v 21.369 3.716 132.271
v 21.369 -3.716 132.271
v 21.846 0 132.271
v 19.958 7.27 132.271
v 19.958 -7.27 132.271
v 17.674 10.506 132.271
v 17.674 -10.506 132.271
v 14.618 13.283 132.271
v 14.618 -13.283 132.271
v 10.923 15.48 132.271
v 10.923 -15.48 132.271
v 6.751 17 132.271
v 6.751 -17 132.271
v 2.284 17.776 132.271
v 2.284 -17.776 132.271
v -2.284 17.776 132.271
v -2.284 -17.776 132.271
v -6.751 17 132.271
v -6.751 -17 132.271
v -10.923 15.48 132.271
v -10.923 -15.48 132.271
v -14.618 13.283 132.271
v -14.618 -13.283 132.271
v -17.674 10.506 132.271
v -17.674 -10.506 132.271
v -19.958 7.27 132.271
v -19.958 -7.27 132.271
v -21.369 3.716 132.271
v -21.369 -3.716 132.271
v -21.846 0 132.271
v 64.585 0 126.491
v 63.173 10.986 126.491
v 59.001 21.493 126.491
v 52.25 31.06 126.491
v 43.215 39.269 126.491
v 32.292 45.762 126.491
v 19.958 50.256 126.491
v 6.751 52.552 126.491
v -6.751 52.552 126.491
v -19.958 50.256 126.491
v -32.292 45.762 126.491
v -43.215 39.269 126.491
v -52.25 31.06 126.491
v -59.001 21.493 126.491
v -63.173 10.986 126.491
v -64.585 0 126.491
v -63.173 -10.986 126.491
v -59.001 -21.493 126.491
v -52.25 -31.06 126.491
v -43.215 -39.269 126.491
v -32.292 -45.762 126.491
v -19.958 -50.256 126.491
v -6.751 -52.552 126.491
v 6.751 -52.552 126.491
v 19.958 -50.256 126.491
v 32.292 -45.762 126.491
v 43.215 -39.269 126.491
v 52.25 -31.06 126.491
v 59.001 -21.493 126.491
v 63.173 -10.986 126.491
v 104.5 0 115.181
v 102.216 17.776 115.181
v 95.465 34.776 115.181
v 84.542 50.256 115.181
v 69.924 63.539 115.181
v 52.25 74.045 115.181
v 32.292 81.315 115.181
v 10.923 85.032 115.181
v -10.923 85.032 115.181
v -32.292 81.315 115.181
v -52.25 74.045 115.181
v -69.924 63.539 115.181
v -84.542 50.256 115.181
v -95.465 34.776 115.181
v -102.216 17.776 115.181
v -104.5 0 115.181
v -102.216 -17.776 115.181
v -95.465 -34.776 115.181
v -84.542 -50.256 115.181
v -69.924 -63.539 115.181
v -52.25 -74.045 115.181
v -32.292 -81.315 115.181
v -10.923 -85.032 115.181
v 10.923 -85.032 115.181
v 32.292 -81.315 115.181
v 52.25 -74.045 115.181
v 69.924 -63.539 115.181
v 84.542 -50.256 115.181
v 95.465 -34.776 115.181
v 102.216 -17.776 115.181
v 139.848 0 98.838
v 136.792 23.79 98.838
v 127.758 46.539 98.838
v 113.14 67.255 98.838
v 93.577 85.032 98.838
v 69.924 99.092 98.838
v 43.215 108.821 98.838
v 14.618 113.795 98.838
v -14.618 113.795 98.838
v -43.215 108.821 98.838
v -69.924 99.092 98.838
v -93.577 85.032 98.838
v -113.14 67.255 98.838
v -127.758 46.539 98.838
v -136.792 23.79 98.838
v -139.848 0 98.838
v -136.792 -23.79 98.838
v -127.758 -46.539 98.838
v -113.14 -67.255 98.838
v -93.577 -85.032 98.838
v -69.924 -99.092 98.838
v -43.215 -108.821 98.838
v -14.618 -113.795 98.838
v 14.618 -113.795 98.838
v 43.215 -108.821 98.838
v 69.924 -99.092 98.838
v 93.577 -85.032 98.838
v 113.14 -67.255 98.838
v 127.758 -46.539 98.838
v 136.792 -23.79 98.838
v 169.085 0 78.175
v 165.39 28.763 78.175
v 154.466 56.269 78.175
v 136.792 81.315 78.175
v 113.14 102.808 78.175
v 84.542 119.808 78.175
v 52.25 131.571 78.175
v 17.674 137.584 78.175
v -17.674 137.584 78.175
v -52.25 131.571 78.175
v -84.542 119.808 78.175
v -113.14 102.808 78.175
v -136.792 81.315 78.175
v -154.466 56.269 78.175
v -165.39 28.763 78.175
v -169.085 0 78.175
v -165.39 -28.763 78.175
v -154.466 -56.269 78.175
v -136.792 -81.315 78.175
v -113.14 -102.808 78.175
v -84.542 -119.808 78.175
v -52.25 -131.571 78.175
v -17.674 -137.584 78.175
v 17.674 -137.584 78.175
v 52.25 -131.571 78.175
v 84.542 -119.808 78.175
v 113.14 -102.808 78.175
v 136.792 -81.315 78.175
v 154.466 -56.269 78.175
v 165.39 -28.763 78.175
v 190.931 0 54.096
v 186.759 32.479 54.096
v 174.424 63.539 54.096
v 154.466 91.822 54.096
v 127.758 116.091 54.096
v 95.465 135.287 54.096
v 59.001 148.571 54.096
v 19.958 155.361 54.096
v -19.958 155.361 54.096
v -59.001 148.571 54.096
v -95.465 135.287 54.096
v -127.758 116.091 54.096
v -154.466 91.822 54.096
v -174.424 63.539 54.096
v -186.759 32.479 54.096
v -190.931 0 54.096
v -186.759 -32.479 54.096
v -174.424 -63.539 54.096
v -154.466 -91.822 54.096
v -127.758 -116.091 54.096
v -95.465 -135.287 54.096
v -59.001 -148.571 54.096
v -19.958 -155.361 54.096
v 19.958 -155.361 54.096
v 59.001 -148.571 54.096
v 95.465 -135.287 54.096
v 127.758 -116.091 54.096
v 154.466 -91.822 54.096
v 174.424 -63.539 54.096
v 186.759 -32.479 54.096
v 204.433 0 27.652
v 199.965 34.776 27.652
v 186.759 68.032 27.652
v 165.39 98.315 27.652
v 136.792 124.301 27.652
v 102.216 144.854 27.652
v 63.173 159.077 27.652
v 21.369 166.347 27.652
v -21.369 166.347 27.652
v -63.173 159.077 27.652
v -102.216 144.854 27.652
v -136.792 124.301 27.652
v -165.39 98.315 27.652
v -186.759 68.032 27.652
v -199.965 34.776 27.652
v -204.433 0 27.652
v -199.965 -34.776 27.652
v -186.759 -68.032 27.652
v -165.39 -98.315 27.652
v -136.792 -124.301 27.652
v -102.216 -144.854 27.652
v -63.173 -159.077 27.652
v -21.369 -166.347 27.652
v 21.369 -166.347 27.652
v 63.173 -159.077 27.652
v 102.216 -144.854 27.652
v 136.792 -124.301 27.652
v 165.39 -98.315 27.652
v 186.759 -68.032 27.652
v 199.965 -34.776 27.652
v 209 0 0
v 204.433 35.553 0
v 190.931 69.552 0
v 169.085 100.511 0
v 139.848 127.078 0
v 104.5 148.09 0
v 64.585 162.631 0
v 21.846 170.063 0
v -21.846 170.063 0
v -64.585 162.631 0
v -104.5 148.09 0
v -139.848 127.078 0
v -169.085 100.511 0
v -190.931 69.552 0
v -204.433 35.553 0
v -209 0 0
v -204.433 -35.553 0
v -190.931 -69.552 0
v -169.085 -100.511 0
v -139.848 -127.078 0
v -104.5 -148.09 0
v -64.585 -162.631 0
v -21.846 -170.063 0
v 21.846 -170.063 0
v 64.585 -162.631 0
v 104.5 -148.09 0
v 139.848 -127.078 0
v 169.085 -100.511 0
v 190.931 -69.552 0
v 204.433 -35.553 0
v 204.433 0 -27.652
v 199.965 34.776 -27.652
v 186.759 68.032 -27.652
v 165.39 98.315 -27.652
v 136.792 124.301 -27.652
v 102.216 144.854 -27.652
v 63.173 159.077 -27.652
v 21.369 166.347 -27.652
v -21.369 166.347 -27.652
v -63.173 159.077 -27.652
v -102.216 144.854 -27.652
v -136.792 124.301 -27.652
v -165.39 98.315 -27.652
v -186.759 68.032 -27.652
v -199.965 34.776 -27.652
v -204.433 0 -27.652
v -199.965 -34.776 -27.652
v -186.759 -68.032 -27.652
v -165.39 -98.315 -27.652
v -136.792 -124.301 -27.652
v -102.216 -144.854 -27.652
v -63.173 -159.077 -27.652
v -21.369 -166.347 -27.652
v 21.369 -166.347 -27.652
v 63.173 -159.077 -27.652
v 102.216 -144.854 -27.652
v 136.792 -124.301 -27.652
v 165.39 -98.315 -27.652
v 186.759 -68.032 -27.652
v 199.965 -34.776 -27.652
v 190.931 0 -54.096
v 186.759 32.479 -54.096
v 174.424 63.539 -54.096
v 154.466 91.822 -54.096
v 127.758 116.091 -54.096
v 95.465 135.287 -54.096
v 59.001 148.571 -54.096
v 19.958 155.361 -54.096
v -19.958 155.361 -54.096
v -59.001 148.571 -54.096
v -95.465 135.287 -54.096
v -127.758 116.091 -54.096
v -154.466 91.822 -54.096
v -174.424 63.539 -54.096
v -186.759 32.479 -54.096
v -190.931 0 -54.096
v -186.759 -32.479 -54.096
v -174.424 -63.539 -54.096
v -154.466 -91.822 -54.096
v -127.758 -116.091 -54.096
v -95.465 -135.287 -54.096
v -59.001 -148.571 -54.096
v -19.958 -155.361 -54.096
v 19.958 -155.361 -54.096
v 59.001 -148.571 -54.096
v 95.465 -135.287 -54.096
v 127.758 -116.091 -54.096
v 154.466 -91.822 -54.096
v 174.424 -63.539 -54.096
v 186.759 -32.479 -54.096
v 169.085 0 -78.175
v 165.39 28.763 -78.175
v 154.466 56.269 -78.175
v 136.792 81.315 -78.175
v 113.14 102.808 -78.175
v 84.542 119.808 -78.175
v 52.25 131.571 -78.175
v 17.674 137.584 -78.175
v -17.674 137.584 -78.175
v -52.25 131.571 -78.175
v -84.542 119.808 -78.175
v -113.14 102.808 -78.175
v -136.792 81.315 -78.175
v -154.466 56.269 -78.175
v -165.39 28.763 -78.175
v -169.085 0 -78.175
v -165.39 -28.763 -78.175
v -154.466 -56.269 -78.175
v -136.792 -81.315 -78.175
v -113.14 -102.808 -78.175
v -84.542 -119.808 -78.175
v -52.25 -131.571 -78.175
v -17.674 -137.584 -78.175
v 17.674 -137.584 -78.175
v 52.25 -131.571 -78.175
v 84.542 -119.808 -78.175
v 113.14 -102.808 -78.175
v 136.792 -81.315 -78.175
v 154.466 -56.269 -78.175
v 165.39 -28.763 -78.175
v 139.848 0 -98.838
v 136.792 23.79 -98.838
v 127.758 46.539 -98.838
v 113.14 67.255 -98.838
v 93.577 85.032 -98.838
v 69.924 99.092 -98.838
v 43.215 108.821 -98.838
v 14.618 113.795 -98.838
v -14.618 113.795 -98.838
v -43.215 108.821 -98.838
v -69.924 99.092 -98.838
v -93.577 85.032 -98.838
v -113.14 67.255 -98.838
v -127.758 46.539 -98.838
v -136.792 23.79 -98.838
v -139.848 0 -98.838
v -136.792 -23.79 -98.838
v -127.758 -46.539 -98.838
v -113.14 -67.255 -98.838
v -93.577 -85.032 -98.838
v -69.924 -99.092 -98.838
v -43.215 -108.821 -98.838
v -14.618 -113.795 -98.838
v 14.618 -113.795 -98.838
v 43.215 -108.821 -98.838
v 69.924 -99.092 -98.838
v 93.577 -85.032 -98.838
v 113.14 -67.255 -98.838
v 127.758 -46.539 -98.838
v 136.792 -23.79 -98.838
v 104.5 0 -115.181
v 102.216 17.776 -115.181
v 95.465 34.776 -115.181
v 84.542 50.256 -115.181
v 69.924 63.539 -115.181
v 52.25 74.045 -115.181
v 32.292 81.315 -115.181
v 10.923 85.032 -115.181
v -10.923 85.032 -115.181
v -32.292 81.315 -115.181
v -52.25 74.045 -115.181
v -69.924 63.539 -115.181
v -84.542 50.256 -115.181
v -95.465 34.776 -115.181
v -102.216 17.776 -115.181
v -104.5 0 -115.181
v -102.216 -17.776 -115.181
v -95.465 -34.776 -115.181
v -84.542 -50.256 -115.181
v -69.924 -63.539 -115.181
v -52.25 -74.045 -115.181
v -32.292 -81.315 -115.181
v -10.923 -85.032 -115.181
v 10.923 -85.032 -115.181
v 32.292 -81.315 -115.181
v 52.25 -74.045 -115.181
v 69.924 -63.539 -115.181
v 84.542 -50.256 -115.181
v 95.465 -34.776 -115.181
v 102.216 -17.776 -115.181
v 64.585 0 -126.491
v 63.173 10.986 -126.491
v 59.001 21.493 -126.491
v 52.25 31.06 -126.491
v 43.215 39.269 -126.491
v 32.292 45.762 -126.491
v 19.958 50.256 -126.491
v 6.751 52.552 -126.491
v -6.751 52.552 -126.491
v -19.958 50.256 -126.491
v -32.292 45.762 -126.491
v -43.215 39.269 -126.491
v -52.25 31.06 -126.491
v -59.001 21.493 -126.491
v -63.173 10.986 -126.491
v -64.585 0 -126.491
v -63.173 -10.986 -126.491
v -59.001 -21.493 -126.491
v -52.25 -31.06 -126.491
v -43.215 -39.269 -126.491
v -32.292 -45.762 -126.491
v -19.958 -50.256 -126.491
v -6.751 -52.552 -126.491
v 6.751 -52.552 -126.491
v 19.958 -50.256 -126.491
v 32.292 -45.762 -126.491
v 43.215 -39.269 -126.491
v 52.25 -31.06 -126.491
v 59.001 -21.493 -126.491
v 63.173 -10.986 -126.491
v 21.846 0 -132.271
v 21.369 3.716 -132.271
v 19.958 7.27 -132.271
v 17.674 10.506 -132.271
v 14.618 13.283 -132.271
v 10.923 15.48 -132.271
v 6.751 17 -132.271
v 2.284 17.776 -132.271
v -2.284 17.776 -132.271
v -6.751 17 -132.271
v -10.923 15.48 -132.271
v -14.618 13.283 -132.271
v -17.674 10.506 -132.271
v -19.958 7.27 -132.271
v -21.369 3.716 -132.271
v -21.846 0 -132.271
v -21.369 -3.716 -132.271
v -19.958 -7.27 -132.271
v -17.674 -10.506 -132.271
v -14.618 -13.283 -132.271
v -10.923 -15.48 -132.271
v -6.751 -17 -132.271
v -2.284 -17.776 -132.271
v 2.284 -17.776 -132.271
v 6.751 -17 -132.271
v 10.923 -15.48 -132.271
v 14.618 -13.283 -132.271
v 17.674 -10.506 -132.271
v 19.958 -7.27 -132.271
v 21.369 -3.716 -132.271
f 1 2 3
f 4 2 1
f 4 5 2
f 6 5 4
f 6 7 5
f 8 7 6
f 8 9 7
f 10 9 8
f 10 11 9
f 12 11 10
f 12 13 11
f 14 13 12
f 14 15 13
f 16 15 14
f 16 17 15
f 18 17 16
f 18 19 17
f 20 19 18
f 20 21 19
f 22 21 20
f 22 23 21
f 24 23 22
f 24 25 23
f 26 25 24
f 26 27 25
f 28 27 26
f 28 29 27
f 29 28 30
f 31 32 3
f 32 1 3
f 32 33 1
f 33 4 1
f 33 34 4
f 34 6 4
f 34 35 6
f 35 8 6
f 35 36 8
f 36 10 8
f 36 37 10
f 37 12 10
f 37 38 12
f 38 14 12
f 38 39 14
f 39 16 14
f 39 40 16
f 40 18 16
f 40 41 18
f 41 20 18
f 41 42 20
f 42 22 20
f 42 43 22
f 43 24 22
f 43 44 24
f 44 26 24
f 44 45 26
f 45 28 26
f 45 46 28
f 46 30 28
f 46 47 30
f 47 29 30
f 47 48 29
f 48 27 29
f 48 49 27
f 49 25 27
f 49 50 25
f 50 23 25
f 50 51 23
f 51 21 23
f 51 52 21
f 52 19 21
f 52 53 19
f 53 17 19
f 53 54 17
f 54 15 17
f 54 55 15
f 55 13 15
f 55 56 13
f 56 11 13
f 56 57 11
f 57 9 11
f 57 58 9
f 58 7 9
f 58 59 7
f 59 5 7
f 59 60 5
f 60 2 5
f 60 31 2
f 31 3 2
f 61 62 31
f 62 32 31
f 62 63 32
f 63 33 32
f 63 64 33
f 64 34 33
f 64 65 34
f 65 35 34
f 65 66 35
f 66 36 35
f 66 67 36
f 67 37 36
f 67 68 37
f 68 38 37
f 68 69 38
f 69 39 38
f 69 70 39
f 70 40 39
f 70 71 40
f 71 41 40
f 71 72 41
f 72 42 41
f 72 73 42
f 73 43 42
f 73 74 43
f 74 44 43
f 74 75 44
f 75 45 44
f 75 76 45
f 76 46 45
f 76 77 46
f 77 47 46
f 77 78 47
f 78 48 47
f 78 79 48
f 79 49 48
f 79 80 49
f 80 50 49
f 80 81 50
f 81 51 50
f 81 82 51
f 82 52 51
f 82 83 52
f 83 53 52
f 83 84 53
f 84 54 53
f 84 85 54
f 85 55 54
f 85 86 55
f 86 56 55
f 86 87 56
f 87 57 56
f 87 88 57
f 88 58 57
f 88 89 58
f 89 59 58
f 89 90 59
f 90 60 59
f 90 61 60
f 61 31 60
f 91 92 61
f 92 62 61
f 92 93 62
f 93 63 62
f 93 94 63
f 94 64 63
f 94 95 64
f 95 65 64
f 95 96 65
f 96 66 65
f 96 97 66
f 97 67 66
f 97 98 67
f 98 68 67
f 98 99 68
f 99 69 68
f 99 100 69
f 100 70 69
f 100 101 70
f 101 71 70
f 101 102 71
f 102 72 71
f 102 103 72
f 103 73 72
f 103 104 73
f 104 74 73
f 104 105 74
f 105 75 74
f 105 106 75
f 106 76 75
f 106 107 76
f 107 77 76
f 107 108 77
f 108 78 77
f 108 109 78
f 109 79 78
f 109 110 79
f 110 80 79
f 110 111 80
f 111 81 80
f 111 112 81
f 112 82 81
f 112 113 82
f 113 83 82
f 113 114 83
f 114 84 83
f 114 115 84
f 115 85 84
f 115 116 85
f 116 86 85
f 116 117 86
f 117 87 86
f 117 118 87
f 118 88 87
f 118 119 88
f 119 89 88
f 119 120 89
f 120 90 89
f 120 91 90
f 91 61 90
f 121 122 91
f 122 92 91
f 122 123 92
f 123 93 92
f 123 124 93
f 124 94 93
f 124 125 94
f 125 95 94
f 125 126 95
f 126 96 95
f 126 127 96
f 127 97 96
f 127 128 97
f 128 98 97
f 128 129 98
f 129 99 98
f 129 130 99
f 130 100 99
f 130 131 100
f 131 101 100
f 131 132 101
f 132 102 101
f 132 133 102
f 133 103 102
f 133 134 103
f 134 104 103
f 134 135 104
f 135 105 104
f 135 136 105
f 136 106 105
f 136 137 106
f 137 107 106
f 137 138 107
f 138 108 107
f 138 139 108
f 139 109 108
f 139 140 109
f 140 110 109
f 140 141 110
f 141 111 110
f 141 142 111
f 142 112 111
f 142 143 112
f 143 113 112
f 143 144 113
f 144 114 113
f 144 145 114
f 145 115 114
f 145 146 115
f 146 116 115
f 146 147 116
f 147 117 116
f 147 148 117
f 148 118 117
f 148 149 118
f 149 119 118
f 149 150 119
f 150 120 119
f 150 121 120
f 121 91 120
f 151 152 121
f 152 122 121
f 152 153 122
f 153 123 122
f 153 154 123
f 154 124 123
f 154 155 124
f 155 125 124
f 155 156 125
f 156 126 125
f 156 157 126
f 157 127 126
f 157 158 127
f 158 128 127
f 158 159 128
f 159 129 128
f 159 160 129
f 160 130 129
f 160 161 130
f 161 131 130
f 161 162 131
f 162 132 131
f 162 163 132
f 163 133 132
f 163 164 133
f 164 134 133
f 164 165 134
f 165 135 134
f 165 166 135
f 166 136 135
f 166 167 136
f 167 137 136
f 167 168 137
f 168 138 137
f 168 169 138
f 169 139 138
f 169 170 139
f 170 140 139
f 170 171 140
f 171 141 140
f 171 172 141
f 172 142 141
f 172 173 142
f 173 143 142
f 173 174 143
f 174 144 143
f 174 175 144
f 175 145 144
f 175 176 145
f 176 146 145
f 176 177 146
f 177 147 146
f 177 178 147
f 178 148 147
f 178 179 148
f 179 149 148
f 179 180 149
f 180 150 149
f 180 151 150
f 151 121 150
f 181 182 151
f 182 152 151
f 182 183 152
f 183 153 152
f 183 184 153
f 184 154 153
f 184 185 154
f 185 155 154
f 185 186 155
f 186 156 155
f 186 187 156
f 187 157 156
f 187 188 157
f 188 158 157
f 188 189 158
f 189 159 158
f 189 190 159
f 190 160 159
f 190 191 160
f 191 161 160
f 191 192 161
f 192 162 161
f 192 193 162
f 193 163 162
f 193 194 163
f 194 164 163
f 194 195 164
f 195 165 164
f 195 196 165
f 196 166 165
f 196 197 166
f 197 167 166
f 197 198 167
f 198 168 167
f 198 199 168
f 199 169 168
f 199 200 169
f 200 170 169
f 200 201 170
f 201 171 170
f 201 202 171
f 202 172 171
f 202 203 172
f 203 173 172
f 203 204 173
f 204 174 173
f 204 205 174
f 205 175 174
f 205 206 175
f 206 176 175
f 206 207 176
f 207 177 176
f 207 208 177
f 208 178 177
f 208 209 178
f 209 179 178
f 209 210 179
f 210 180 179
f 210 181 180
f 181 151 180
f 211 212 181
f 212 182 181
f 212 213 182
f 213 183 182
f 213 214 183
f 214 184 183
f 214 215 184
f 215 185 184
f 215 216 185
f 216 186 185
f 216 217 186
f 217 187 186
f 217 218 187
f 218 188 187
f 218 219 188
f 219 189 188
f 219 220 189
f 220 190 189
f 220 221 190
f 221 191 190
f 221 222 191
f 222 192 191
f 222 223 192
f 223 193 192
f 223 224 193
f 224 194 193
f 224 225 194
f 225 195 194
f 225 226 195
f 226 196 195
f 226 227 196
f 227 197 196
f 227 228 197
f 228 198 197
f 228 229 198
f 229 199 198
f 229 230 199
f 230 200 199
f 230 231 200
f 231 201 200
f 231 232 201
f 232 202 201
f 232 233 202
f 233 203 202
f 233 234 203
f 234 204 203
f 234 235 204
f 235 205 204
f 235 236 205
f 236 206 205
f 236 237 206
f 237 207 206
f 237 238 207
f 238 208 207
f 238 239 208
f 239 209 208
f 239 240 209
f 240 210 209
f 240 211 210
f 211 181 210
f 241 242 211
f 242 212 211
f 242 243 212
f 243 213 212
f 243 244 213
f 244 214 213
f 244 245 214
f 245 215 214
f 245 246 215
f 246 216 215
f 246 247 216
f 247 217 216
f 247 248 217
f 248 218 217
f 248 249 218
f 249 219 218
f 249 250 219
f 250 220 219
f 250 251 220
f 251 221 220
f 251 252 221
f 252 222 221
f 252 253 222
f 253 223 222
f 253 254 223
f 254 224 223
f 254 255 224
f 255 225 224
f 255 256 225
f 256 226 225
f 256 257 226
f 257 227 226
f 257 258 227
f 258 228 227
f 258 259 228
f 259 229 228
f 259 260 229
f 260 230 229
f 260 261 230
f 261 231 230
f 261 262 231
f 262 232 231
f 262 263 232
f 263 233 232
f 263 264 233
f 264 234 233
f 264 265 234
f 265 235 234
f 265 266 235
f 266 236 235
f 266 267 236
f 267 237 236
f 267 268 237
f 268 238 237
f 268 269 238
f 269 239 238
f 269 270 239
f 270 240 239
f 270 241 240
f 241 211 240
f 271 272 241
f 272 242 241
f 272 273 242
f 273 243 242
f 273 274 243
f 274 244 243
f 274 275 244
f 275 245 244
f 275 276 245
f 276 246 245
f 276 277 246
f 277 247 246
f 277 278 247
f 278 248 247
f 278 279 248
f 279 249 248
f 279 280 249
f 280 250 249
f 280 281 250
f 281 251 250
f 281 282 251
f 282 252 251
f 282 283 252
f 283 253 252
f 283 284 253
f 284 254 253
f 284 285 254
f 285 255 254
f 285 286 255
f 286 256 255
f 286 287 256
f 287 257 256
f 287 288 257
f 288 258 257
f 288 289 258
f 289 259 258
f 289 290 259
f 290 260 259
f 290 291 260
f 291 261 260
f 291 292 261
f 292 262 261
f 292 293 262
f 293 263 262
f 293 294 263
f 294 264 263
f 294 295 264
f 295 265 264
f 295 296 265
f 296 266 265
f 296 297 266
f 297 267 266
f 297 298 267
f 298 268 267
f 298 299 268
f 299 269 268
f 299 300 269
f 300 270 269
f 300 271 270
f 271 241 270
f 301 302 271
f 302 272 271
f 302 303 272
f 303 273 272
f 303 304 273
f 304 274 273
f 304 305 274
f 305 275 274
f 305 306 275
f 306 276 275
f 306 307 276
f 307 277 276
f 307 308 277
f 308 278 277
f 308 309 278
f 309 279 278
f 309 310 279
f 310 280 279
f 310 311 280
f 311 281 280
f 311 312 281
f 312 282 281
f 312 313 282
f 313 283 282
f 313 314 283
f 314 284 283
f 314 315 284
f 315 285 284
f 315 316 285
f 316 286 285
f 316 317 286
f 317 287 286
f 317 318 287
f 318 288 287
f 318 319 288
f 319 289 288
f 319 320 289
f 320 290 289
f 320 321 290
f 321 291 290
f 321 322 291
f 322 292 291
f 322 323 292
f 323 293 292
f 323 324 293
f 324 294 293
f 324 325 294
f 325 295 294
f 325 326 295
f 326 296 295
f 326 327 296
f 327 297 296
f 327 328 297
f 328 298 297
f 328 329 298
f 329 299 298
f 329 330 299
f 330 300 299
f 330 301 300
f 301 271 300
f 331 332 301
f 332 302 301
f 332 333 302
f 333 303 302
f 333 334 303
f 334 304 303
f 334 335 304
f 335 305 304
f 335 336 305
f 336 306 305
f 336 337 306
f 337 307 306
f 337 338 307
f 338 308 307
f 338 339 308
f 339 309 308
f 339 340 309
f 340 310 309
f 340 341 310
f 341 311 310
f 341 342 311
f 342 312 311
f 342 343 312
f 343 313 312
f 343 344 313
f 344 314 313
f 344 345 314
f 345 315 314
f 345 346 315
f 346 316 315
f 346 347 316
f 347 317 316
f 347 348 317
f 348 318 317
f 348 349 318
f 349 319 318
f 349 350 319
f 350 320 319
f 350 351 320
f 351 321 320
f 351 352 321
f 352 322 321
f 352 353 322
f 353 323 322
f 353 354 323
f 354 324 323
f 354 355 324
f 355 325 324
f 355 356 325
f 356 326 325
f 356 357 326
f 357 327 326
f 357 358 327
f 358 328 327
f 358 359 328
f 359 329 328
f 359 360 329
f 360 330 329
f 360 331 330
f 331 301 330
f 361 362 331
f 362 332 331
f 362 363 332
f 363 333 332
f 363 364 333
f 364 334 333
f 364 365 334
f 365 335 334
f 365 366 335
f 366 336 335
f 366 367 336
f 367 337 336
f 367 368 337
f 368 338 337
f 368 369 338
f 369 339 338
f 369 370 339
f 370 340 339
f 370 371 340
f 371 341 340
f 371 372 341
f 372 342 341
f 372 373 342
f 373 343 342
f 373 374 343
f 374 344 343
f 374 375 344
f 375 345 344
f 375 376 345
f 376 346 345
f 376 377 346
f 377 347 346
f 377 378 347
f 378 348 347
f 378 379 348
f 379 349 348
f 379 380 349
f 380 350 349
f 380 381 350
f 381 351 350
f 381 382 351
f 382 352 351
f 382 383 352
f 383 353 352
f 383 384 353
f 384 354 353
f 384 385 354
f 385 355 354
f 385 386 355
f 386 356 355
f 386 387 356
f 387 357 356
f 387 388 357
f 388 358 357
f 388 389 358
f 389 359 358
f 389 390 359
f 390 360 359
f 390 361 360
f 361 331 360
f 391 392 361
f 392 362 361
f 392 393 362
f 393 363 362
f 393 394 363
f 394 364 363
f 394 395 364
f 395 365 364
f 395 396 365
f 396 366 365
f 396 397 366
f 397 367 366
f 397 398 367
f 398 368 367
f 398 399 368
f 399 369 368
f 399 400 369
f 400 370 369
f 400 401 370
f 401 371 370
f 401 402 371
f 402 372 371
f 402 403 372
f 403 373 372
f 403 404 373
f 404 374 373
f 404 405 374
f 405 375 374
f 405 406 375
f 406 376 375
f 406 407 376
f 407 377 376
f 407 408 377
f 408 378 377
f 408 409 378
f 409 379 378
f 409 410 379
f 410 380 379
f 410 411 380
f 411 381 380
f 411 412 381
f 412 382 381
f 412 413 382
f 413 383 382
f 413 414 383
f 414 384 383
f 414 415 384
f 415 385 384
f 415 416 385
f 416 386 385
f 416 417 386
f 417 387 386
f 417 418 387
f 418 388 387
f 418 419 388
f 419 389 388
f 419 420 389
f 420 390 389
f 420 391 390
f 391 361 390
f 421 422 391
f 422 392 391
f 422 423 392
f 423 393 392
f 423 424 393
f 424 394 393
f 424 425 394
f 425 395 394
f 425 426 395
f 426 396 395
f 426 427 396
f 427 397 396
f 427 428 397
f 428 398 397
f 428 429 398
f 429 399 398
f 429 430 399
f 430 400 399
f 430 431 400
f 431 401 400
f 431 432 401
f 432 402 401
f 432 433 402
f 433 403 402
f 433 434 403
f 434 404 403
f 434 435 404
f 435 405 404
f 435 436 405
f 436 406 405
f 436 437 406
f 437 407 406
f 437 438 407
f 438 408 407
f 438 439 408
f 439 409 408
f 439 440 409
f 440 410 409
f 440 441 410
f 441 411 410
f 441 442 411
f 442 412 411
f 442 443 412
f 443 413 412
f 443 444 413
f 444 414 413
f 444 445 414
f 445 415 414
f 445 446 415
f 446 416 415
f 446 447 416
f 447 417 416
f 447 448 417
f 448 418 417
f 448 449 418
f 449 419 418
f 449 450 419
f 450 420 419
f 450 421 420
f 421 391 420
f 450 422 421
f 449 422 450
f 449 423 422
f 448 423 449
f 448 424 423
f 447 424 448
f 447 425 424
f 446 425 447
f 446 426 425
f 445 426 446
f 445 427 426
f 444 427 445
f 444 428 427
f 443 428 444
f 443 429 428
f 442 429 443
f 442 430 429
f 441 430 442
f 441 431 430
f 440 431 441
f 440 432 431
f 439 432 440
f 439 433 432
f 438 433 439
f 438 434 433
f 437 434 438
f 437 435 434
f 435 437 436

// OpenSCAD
// Generated by SolidPython 1.0.1 on 2020-07-29 00:46:49


scale(v = [11, 9, 7]) {
	sphere(r = 19);
}
/***********************************************
*********      SolidPython code:      **********
************************************************
 
# import packages: SolidPython
from solid import *
from solid.utils import *
from itertools import chain, combinations, permutations


class Resize:

    def __init__(self, scad_file):
        self.scad_file = scad_file
        #self.scad_file = import_scad(scad_file)
        # cone/cylinder param:
        self.r1 = 0
        self.r2 = 0
        self.h = 0
        # rectangular prism param:
        self.w = 0
        self.l = 0
        # ellipse param:
        self.r = 0

    # import OpenScad code (file name corresponds to shape)


    # classify shape + parameters
    def assign(self, param1, param2, param3):
        if self.scad_file == 'cone.scad':
            self.r1 = param1
            self.r2 = param2
            self.h = param3
        elif self.scad_file == 'cylinder.scad':
            self.r1 = param1
            self.r2 = param2
            self.h = param3
        elif self.scad_file == 'rectangularPrism.scad':
            self.h = param1
            self.l = param2
            self.w = param3
        else:
            self.r = param1
            self.h = param2

    # resize parameters
    def iterate(self):
        x = range(3, 20, 2)
        i = 1
        if self.scad_file == 'cone.scad':
            tempList = list(permutations(x, 2))
            for temp in tempList:
                param1 = temp[0]
                param2 = temp[1]
                filepath = 'produced_scad_files/' + 'cone' + str(param1) + '_' + str(param2) + '_' + '.scad'
                scad_render_to_file(cylinder(h=param1, r1=param2, r2=0), filepath)

        elif self.scad_file == 'cylinder.scad':
            tempList = list(permutations(x, 3))
            for temp in tempList:
                param1 = temp[0]
                param2 = temp[1]
                filepath = 'produced_scad_files/' + 'cylinder' + str(param1) + '_' + str(param2) + '_' + '.scad'
                scad_render_to_file(cylinder(h=param1, r1=param2, r2=param2), filepath)

        elif self.scad_file == 'rectangularPrism.scad':
            tempList = list(permutations(x, 3))
            for temp in tempList:
                param1 = temp[0]
                param2 = temp[1]
                param3 = temp[2]
                filepath = 'produced_scad_files/' + 'rectangularPrism' + str(param1) + '_' + str(param2) + '_' + str(
                    param3) + '.scad'
                scad_render_to_file(cube(size=(param1, param2, param3)), filepath)

        elif self.scad_file == 'ellipse.scad':
            tempList = list(permutations(x, 4))
            for temp in tempList:
                param1 = temp[0]
                param2 = temp[1]
                param3 = temp[2]
                param4 = temp[3]
                filepath = 'produced_scad_files/' + 'ellipse' + str(param1) + '_' + str(param2) + '_' + str(param3) + '_' + str(param4) + '.scad'
                scad_render_to_file(scale([param1, param2, param3])(sphere(r=param4)), filepath)

    def render_to_scadfile(self):
        scad_render_to_file(scad, 'example.scad') 
 
************************************************/
